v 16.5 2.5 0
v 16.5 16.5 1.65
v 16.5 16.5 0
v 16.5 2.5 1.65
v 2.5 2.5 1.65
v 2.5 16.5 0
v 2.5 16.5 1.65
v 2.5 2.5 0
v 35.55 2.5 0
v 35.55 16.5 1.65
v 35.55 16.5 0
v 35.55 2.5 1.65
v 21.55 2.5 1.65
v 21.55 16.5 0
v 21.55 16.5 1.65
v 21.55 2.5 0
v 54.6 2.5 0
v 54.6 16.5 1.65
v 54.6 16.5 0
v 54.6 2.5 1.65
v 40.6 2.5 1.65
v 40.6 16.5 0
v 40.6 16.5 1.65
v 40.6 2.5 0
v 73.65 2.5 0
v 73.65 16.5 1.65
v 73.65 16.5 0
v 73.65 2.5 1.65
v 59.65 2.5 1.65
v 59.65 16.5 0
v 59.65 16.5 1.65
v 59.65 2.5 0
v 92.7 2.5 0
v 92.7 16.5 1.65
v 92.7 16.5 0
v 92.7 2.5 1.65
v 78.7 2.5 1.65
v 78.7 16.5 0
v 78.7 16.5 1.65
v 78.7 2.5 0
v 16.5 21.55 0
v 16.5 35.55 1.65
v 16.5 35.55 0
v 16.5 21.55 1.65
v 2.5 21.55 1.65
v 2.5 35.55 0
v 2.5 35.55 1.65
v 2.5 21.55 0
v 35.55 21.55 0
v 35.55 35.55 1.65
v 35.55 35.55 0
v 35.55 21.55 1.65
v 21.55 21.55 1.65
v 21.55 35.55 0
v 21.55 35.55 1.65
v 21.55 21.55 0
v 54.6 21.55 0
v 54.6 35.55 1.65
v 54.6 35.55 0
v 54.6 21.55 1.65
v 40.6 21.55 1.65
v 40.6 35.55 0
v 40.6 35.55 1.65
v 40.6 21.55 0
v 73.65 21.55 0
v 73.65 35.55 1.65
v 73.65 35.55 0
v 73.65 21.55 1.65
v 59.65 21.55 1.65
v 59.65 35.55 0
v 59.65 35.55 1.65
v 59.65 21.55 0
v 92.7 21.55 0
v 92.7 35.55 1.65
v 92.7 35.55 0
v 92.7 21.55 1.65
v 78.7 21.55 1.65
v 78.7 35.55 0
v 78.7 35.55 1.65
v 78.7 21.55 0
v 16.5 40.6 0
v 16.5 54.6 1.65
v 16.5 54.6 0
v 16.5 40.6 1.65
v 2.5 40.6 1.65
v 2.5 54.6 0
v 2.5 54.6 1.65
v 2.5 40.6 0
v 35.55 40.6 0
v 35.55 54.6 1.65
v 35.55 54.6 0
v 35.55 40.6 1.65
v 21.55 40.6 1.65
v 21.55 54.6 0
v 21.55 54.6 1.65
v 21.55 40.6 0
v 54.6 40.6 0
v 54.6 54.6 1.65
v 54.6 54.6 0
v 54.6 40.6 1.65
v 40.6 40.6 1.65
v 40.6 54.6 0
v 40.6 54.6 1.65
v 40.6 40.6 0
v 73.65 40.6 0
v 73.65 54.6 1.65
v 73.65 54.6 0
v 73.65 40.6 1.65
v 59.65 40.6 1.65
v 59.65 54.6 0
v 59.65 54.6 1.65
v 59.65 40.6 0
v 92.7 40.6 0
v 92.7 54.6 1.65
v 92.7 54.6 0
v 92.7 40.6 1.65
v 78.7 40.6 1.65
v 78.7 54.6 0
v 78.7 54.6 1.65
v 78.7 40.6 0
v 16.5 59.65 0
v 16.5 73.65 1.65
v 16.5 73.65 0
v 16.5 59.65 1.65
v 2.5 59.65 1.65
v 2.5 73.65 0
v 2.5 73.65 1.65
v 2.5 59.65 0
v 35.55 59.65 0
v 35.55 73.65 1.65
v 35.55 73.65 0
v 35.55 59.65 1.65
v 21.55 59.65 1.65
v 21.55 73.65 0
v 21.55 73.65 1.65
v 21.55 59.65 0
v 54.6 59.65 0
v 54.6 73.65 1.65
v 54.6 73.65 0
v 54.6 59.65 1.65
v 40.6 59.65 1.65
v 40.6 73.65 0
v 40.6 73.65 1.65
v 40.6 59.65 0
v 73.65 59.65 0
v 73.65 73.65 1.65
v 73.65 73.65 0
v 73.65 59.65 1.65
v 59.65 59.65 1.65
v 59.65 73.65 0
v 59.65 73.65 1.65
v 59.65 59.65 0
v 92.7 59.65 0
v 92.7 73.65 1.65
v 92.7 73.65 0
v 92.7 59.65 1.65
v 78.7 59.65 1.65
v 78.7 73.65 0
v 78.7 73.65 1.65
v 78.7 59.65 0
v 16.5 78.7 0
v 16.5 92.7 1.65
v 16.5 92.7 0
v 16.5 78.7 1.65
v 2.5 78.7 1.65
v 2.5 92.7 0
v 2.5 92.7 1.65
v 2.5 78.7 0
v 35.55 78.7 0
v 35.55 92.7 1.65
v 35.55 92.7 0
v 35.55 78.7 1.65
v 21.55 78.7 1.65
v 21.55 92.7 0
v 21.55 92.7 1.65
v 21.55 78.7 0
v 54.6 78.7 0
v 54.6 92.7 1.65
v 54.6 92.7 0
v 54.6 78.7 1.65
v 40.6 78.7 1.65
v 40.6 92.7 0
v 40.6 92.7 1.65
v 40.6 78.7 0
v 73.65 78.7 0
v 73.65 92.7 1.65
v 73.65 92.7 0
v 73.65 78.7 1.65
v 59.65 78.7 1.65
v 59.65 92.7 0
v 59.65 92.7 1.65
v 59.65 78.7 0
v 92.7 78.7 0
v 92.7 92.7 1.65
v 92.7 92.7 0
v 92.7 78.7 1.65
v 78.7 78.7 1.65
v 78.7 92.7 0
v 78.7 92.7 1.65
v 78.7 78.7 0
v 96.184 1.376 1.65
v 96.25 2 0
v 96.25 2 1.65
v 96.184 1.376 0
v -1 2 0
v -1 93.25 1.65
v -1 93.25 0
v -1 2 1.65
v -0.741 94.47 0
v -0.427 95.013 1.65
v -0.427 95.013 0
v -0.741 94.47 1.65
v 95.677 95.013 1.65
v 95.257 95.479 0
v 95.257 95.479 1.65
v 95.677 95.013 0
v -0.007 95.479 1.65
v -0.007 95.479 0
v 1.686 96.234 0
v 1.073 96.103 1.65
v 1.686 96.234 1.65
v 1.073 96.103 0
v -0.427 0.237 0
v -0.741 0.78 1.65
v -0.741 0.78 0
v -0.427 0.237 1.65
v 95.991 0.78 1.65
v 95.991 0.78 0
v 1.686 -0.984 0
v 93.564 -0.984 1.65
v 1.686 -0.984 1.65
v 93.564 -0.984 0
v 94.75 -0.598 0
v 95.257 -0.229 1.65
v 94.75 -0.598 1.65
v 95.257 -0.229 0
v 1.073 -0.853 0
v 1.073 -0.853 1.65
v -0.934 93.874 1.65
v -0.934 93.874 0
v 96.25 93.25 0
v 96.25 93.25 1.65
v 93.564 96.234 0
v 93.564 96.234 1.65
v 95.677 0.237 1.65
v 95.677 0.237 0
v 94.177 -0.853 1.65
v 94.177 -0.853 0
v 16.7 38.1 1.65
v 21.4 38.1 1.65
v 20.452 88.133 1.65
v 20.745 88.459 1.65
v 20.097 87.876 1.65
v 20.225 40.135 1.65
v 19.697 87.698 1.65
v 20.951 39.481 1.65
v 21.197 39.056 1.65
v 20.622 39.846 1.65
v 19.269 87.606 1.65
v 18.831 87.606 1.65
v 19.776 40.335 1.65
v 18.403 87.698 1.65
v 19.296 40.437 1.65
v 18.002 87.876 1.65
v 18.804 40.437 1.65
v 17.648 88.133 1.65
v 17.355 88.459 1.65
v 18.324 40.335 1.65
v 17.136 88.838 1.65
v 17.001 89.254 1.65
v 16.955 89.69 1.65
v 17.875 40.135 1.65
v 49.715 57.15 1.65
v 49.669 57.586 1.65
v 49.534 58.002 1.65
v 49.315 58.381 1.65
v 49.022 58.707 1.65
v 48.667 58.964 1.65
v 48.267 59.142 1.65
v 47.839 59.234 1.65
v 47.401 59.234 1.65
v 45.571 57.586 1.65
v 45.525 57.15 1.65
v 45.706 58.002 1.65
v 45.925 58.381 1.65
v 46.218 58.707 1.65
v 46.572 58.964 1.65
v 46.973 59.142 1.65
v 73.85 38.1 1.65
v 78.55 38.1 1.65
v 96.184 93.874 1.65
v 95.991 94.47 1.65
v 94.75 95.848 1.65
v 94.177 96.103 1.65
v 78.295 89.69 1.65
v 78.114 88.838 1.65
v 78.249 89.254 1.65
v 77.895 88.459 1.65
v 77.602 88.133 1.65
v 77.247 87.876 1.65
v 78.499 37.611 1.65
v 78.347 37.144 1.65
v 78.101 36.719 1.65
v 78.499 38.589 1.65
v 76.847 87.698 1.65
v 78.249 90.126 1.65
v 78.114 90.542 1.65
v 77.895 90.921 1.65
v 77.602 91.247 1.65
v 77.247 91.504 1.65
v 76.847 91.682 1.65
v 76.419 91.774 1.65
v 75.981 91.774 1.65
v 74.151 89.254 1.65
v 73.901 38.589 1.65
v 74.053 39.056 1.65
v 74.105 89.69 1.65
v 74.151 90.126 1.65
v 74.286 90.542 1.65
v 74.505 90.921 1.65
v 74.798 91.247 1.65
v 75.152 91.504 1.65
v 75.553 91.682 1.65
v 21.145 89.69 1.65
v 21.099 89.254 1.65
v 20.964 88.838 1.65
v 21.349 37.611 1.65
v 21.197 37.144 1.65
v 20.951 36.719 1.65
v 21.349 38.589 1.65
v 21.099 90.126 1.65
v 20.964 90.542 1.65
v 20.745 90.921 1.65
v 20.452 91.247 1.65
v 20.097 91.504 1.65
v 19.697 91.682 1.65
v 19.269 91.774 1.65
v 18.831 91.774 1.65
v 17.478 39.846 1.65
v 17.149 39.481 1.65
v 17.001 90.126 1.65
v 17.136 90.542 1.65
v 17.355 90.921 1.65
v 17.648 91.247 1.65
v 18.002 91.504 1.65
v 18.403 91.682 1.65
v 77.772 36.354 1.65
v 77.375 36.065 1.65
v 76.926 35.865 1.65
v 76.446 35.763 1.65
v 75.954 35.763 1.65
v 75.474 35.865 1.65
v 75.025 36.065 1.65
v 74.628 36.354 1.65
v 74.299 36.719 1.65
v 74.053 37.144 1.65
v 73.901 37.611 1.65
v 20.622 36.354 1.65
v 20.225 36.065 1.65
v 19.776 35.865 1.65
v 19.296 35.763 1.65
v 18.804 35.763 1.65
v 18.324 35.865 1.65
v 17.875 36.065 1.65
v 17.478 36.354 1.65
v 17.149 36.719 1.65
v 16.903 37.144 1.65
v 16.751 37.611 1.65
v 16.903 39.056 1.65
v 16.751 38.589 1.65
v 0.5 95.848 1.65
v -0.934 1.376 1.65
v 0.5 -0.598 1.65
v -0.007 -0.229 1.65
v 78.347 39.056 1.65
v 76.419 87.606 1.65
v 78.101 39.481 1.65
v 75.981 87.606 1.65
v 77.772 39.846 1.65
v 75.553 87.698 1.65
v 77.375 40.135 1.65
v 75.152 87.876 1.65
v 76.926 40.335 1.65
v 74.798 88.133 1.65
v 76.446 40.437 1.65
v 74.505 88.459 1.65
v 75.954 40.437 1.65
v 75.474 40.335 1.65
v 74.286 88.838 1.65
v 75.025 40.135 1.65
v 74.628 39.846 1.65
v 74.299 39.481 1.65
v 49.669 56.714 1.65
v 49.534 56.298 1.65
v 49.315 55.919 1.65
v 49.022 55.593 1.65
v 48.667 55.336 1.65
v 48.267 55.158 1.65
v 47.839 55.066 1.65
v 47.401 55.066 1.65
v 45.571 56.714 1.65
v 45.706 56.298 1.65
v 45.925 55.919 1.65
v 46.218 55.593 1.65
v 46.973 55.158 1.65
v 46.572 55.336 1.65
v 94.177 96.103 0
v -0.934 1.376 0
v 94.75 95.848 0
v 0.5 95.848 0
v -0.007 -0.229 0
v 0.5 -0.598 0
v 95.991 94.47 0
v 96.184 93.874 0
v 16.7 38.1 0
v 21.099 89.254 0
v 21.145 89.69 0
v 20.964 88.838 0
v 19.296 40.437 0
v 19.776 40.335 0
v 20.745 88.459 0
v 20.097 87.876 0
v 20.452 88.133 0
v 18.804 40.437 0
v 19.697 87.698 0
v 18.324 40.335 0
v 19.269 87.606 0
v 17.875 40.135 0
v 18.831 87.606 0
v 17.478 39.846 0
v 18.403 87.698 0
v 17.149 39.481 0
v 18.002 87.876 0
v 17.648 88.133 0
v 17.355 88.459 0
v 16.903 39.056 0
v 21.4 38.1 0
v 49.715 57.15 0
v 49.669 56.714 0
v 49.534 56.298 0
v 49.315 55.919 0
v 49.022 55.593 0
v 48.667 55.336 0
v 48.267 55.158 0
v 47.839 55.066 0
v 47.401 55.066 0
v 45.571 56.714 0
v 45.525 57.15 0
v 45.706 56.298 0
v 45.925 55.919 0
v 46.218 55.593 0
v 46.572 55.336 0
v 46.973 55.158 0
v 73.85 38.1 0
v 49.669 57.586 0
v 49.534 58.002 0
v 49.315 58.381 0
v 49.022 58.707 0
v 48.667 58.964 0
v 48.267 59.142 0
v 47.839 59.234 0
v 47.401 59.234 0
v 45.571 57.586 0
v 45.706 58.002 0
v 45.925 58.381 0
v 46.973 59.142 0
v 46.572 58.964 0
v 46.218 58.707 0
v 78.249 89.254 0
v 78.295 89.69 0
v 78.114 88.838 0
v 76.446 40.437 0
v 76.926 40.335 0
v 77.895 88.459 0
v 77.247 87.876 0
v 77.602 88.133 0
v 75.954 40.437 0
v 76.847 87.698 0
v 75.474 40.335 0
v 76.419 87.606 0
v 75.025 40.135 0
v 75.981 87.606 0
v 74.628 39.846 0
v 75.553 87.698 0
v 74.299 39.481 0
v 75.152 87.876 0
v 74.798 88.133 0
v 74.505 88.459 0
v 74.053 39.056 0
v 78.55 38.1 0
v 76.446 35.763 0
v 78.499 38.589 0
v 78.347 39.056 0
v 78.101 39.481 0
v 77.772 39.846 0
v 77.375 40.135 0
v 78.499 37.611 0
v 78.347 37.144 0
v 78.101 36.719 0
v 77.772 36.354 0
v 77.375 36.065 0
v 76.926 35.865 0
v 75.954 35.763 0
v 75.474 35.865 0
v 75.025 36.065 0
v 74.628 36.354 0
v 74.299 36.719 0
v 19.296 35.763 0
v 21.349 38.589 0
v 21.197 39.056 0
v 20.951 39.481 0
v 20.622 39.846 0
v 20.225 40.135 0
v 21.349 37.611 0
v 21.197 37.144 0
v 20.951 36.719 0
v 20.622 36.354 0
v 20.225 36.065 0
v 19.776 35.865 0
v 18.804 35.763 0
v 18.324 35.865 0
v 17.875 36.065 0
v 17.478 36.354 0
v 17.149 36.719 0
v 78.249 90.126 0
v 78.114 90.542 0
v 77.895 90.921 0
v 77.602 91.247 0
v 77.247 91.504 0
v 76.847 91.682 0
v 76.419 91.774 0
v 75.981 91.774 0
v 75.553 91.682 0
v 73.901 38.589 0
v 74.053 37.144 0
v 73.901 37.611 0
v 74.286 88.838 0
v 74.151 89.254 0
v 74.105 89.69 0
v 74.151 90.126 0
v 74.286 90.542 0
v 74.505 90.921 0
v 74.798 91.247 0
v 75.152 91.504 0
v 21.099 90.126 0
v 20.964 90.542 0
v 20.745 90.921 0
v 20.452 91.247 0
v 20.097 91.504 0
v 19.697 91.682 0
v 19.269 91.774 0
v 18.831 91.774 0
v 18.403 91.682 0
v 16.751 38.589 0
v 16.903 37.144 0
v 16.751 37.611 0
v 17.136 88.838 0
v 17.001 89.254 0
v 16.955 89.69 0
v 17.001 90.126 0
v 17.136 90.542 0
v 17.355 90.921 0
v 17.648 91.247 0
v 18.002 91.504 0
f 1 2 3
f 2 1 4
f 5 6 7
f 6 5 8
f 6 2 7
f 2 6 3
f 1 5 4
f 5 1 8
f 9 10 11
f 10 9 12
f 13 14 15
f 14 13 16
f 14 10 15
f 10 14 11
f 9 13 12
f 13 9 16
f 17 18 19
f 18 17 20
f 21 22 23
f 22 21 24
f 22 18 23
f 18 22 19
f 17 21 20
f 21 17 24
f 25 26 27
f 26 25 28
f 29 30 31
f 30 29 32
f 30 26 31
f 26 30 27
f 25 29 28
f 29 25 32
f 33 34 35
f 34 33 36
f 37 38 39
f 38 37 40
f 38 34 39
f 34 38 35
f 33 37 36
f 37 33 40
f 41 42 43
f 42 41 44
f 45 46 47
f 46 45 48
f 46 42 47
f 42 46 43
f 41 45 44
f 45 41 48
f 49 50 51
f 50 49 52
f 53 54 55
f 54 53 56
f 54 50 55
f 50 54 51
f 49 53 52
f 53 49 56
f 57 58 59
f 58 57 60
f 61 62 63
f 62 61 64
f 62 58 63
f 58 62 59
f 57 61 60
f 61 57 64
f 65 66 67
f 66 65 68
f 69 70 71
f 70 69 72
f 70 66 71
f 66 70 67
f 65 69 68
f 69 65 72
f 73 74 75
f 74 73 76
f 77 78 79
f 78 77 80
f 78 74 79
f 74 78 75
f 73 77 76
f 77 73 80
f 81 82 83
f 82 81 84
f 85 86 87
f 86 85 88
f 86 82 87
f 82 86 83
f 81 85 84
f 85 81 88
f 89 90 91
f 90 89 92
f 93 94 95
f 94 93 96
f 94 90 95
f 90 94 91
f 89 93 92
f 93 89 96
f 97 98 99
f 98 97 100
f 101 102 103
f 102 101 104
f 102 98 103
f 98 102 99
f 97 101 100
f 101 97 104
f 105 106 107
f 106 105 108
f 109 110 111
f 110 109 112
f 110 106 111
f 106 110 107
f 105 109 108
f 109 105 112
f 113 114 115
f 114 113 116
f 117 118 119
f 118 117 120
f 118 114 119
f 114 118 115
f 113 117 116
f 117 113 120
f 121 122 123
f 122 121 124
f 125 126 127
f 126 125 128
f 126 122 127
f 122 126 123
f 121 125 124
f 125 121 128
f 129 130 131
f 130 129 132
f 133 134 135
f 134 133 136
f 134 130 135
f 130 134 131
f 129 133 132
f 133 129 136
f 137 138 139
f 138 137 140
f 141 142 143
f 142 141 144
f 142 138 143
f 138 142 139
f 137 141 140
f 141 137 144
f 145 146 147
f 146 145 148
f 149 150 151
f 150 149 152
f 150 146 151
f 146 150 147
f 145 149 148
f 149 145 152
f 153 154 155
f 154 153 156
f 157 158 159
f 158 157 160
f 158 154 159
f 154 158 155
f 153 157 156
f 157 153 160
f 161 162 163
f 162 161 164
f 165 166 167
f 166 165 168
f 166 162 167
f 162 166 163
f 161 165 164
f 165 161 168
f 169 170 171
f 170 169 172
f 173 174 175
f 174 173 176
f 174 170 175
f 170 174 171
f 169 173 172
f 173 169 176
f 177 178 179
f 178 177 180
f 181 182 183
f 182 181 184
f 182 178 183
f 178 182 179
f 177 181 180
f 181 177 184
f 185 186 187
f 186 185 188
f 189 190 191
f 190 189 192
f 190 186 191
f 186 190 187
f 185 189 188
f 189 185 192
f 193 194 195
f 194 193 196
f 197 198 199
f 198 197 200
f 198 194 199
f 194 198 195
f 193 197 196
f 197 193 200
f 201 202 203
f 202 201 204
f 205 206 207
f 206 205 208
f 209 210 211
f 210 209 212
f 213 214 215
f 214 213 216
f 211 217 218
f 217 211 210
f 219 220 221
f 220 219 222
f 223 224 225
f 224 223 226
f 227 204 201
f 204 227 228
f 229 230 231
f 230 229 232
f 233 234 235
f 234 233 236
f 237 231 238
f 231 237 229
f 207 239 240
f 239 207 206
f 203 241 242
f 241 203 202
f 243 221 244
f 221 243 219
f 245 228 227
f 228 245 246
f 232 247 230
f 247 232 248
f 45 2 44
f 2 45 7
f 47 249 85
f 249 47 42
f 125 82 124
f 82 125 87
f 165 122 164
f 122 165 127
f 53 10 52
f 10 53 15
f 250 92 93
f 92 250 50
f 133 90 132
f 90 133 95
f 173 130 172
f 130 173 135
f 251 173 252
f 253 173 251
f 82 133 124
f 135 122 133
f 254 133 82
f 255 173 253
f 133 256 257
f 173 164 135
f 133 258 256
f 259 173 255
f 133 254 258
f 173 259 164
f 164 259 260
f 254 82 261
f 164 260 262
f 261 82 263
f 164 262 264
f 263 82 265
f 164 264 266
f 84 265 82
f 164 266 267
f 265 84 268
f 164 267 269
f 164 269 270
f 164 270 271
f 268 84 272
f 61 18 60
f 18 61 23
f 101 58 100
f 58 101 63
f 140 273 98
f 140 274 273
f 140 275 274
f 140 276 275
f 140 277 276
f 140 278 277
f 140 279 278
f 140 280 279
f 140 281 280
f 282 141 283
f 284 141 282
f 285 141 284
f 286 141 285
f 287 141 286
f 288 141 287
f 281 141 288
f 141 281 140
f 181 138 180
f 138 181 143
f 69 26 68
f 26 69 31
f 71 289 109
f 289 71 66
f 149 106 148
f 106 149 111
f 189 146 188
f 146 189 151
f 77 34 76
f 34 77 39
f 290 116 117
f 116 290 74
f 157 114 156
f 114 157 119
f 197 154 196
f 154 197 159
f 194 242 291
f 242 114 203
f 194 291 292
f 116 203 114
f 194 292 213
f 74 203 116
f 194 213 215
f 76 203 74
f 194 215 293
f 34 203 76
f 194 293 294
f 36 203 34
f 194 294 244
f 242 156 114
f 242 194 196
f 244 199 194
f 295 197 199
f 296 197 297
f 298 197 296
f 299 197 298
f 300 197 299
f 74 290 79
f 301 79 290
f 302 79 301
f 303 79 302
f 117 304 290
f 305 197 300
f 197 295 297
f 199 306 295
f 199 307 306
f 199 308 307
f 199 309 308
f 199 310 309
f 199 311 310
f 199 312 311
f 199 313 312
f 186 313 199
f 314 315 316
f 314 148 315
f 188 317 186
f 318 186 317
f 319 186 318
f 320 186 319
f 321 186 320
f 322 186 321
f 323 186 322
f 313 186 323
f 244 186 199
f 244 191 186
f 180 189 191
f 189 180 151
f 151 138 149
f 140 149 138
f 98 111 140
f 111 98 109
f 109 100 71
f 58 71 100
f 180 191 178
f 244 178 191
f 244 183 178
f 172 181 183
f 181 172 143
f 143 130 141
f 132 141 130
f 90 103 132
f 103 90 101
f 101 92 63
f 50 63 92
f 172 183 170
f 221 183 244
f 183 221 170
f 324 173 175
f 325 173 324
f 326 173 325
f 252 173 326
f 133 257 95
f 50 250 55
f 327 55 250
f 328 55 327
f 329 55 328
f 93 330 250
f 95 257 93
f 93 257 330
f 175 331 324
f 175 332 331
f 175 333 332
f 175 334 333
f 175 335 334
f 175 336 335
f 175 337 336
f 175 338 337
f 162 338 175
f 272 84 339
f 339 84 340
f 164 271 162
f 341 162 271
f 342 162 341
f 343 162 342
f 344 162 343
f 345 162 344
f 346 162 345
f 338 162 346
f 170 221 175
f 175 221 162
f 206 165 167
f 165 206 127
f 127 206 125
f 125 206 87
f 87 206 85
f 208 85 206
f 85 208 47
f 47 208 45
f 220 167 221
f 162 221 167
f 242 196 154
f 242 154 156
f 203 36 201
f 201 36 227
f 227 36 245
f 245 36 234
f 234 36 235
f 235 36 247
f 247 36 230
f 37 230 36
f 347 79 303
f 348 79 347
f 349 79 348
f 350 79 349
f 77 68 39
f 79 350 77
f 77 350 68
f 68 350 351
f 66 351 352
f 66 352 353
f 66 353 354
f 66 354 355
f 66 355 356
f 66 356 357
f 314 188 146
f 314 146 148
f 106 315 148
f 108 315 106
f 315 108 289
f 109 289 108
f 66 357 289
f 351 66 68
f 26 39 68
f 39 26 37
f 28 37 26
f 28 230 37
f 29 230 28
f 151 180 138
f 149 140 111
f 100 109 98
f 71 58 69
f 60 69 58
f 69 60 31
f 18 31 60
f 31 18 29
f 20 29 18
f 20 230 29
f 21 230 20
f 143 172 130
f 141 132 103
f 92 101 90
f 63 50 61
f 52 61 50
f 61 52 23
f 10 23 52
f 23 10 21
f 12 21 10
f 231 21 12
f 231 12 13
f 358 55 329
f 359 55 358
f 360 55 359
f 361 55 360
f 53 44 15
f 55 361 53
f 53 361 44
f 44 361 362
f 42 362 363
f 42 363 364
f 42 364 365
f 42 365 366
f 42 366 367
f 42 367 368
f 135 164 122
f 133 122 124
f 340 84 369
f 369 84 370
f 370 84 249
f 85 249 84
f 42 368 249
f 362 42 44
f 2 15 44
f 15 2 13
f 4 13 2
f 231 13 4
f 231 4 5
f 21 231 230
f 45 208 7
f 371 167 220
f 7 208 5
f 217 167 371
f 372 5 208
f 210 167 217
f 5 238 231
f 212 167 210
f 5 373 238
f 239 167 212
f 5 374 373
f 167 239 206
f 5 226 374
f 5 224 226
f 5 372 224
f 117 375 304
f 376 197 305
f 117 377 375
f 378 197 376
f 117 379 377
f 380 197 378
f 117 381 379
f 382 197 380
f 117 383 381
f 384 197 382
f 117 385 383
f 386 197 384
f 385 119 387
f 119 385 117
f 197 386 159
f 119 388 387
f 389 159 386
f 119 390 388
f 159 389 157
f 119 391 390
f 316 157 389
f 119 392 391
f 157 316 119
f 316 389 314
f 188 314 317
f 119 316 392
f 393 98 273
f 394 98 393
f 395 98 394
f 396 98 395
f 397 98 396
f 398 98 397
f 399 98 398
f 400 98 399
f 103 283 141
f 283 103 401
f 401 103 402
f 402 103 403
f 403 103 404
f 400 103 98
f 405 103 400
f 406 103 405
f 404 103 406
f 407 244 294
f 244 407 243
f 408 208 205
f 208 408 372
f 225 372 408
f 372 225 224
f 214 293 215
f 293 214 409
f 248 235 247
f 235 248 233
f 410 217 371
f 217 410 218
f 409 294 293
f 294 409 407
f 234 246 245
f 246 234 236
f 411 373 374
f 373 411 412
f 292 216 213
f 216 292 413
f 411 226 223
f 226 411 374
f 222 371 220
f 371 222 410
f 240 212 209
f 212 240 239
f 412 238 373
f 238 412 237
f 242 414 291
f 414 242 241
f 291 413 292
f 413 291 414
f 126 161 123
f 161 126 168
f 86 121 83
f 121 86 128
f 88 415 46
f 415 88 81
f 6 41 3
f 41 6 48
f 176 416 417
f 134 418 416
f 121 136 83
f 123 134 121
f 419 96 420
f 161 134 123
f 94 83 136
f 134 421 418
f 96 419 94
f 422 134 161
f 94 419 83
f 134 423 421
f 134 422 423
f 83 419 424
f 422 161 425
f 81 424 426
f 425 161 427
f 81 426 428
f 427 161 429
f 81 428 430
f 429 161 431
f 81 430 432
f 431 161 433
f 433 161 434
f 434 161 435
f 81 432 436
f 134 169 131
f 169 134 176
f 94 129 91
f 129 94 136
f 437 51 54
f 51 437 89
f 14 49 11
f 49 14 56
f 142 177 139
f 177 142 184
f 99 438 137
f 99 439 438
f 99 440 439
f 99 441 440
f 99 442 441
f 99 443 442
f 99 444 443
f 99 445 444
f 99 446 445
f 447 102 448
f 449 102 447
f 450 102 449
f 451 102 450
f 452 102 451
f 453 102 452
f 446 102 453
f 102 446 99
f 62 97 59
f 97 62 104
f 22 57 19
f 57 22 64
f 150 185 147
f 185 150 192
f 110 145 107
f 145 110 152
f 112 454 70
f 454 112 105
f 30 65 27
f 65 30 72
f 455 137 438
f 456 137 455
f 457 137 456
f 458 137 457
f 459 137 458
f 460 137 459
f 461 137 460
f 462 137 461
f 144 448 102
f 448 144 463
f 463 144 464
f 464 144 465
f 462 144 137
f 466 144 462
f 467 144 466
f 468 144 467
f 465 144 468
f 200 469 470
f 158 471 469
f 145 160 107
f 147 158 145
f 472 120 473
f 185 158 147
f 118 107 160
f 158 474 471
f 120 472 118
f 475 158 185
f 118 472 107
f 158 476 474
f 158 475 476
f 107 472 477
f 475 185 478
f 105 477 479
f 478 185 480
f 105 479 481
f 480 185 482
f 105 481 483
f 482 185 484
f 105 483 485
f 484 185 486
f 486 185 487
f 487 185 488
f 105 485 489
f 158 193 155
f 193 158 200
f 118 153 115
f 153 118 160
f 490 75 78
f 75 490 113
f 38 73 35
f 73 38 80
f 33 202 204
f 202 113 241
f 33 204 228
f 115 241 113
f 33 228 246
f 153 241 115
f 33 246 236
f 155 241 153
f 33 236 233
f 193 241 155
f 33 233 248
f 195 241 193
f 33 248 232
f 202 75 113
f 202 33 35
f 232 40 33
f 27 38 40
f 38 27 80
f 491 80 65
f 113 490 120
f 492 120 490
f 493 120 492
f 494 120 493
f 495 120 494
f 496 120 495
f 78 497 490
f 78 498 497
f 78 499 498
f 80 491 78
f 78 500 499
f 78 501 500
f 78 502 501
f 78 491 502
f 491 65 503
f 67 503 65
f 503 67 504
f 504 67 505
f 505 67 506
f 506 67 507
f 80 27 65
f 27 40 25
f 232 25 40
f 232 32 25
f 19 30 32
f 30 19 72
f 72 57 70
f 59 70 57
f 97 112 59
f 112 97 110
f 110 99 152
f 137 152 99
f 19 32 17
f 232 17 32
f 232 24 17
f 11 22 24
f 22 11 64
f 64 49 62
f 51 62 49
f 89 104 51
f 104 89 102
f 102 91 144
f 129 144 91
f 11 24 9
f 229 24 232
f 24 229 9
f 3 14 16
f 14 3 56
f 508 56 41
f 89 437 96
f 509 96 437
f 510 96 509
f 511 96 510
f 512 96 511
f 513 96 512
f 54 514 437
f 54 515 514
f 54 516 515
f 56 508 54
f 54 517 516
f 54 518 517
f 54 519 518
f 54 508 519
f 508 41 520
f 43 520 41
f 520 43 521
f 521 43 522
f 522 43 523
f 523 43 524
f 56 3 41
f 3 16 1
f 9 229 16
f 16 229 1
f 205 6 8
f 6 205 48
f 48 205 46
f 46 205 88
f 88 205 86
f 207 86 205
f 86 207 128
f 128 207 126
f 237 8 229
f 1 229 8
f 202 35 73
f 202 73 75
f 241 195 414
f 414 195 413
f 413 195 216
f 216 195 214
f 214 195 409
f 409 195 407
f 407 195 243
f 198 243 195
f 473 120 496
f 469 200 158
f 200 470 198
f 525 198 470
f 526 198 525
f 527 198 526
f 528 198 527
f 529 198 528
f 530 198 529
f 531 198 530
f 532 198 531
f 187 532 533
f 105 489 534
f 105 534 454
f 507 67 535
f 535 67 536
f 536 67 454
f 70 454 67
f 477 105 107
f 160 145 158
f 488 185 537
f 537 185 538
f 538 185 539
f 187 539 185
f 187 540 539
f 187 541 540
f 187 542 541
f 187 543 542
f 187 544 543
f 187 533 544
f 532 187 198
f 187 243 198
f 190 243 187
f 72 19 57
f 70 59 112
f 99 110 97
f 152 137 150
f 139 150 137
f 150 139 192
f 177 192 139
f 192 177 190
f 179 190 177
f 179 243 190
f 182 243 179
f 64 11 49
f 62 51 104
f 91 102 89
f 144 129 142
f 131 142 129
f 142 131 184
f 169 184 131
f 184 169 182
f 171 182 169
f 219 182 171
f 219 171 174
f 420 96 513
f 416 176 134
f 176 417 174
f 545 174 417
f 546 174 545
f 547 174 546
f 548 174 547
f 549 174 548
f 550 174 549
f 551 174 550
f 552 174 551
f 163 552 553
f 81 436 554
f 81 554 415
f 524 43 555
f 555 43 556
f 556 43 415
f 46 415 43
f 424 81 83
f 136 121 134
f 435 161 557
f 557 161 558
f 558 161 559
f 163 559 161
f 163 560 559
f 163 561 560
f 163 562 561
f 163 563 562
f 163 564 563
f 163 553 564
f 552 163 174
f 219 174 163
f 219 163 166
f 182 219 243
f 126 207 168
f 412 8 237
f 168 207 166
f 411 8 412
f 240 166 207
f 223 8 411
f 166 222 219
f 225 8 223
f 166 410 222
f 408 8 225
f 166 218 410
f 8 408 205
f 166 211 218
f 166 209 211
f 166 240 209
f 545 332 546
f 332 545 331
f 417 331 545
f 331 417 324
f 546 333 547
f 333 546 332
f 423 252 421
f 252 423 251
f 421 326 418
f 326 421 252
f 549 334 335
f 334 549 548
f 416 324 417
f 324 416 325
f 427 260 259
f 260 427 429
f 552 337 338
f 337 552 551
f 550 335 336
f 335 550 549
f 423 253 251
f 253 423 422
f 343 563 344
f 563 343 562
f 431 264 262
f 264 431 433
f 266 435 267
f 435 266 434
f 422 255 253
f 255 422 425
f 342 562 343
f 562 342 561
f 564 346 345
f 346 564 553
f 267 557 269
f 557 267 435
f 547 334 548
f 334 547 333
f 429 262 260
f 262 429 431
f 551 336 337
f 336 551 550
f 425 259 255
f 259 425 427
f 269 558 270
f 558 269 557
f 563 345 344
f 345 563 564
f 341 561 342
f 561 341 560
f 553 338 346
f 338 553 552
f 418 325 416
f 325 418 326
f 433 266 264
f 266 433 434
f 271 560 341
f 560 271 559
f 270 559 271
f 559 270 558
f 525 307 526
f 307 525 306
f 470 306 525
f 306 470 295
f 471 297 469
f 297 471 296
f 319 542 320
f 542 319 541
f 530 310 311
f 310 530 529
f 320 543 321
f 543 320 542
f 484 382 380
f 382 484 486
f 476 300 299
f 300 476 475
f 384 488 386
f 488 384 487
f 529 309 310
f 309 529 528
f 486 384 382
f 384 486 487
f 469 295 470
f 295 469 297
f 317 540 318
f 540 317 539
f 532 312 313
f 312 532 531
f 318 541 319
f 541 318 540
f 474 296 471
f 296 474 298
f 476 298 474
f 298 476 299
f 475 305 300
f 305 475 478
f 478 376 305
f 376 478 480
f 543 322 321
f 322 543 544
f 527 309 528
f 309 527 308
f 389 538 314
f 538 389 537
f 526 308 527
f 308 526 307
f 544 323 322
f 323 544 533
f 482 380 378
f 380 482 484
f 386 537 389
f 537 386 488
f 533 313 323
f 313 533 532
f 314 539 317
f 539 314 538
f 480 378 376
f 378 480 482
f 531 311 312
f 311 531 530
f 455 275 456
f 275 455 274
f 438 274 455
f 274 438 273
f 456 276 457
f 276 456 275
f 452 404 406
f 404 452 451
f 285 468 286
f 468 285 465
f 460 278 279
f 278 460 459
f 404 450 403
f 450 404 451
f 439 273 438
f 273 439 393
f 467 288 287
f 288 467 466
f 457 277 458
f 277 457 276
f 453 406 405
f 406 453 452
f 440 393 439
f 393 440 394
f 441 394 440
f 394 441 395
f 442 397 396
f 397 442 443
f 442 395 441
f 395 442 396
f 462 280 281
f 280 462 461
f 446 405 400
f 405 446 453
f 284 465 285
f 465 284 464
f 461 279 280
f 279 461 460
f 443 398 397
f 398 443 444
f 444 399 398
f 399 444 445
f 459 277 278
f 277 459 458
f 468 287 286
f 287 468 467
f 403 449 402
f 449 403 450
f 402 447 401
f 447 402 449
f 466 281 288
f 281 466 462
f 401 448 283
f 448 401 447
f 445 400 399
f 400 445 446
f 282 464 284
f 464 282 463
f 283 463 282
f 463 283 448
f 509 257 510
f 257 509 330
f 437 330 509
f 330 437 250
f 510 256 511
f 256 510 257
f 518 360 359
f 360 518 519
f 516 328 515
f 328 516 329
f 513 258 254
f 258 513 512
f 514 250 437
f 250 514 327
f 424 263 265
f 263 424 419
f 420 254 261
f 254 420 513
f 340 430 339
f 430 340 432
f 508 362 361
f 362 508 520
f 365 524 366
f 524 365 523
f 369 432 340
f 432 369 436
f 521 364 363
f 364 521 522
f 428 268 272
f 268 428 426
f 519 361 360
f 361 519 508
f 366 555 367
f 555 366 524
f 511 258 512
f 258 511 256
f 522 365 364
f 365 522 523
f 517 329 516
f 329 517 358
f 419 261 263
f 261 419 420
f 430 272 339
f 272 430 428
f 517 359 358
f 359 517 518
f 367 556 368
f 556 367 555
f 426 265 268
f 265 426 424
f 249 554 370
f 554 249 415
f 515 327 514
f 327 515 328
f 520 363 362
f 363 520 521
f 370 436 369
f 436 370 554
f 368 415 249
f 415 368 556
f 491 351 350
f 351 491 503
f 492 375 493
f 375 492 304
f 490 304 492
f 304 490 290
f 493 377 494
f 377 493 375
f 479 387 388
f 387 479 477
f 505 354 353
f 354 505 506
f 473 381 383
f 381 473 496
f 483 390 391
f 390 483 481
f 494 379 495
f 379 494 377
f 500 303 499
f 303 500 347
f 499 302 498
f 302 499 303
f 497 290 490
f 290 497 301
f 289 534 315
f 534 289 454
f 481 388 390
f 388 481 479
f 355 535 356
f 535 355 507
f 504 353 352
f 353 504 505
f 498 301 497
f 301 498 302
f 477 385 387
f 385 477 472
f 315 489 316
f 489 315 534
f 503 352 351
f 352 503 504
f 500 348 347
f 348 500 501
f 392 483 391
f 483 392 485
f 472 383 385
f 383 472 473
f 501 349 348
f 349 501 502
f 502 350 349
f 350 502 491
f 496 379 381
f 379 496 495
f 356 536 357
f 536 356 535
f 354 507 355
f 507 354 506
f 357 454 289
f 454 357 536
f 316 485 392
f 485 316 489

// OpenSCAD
/* 1u Plate */
difference() {
    translate([2,2,0])
    color([0.5,0.5,0.5])  minkowski(){
        cube([91.25,91.25,1.6]);
        cylinder($fn=30,r=3, h=0.05);
    }
    
    /* Screw holes */
    /* Top */
    translate([19.05,89.69,0])
            ScrewHole();
    translate([76.20,89.69,0])
            ScrewHole();
    /* Center */
    translate([47.62,57.15,0])
            ScrewHole();
    /* Bottom */
    translate([19.05,38.10,0])
            ScrewHoleBig();
    translate([76.20,38.10,0])
            ScrewHoleBig();
    
    
    /* Switch cutouts */
    translate([2.5,2.5,-1])
    {
        /* Row 0 */
        translate([0,0,0])
        {
            cube([14,14,8]);
            
            translate([19.05,0,0])
            cube([14,14,8]);
            
            translate([38.1,0,0])
            cube([14,14,8]);
            
            translate([57.15,0,0])
            cube([14,14,8]);
            
            translate([76.2,0,0])
            cube([14,14,8]);
        }
        
        /* Row 1 */
        translate([0,19.05,0])
        {
            cube([14,14,8]);
            
            translate([19.05,0,0])
            cube([14,14,8]);
            
            translate([38.1,0,0])
            cube([14,14,8]);
            
            translate([57.15,0,0])
            cube([14,14,8]);
            
            translate([76.2,0,0])
            cube([14,14,8]);
        }
        
        /* Row 2 */
        translate([0,38.1,0])
        {
            cube([14,14,8]);
            
            translate([19.05,0,0])
            cube([14,14,8]);
            
            translate([38.1,0,0])
            cube([14,14,8]);
            
            translate([57.15,0,0])
            cube([14,14,8]);
            
            translate([76.2,0,0])
            cube([14,14,8]);
        }
        
        /* Row 3 */
        translate([0,57.15,0])
        {
            cube([14,14,8]);
            
            translate([19.05,0,0])
            cube([14,14,8]);
            
            translate([38.1,0,0])
            cube([14,14,8]);
            
            translate([57.15,0,0])
            cube([14,14,8]);
            
            translate([76.2,0,0])
            cube([14,14,8]);
        }
        
        /* Row 4 */
        translate([0,76.2,0])
        {
            cube([14,14,8]);
            
            translate([19.05,0,0])
            cube([14,14,8]);
            
            translate([38.1,0,0])
            cube([14,14,8]);
            
            translate([57.15,0,0])
            cube([14,14,8]);
            
            translate([76.2,0,0])
            cube([14,14,8]);
        }
    }
}

module ScrewHole()
{
    color([1,1,1]) cylinder($fn=30,h=15,d=4.19, center=true);
}
module ScrewHoleBig()
{
    color([1,1,1]) cylinder($fn=30,h=15,d=4.7, center=true);
}
